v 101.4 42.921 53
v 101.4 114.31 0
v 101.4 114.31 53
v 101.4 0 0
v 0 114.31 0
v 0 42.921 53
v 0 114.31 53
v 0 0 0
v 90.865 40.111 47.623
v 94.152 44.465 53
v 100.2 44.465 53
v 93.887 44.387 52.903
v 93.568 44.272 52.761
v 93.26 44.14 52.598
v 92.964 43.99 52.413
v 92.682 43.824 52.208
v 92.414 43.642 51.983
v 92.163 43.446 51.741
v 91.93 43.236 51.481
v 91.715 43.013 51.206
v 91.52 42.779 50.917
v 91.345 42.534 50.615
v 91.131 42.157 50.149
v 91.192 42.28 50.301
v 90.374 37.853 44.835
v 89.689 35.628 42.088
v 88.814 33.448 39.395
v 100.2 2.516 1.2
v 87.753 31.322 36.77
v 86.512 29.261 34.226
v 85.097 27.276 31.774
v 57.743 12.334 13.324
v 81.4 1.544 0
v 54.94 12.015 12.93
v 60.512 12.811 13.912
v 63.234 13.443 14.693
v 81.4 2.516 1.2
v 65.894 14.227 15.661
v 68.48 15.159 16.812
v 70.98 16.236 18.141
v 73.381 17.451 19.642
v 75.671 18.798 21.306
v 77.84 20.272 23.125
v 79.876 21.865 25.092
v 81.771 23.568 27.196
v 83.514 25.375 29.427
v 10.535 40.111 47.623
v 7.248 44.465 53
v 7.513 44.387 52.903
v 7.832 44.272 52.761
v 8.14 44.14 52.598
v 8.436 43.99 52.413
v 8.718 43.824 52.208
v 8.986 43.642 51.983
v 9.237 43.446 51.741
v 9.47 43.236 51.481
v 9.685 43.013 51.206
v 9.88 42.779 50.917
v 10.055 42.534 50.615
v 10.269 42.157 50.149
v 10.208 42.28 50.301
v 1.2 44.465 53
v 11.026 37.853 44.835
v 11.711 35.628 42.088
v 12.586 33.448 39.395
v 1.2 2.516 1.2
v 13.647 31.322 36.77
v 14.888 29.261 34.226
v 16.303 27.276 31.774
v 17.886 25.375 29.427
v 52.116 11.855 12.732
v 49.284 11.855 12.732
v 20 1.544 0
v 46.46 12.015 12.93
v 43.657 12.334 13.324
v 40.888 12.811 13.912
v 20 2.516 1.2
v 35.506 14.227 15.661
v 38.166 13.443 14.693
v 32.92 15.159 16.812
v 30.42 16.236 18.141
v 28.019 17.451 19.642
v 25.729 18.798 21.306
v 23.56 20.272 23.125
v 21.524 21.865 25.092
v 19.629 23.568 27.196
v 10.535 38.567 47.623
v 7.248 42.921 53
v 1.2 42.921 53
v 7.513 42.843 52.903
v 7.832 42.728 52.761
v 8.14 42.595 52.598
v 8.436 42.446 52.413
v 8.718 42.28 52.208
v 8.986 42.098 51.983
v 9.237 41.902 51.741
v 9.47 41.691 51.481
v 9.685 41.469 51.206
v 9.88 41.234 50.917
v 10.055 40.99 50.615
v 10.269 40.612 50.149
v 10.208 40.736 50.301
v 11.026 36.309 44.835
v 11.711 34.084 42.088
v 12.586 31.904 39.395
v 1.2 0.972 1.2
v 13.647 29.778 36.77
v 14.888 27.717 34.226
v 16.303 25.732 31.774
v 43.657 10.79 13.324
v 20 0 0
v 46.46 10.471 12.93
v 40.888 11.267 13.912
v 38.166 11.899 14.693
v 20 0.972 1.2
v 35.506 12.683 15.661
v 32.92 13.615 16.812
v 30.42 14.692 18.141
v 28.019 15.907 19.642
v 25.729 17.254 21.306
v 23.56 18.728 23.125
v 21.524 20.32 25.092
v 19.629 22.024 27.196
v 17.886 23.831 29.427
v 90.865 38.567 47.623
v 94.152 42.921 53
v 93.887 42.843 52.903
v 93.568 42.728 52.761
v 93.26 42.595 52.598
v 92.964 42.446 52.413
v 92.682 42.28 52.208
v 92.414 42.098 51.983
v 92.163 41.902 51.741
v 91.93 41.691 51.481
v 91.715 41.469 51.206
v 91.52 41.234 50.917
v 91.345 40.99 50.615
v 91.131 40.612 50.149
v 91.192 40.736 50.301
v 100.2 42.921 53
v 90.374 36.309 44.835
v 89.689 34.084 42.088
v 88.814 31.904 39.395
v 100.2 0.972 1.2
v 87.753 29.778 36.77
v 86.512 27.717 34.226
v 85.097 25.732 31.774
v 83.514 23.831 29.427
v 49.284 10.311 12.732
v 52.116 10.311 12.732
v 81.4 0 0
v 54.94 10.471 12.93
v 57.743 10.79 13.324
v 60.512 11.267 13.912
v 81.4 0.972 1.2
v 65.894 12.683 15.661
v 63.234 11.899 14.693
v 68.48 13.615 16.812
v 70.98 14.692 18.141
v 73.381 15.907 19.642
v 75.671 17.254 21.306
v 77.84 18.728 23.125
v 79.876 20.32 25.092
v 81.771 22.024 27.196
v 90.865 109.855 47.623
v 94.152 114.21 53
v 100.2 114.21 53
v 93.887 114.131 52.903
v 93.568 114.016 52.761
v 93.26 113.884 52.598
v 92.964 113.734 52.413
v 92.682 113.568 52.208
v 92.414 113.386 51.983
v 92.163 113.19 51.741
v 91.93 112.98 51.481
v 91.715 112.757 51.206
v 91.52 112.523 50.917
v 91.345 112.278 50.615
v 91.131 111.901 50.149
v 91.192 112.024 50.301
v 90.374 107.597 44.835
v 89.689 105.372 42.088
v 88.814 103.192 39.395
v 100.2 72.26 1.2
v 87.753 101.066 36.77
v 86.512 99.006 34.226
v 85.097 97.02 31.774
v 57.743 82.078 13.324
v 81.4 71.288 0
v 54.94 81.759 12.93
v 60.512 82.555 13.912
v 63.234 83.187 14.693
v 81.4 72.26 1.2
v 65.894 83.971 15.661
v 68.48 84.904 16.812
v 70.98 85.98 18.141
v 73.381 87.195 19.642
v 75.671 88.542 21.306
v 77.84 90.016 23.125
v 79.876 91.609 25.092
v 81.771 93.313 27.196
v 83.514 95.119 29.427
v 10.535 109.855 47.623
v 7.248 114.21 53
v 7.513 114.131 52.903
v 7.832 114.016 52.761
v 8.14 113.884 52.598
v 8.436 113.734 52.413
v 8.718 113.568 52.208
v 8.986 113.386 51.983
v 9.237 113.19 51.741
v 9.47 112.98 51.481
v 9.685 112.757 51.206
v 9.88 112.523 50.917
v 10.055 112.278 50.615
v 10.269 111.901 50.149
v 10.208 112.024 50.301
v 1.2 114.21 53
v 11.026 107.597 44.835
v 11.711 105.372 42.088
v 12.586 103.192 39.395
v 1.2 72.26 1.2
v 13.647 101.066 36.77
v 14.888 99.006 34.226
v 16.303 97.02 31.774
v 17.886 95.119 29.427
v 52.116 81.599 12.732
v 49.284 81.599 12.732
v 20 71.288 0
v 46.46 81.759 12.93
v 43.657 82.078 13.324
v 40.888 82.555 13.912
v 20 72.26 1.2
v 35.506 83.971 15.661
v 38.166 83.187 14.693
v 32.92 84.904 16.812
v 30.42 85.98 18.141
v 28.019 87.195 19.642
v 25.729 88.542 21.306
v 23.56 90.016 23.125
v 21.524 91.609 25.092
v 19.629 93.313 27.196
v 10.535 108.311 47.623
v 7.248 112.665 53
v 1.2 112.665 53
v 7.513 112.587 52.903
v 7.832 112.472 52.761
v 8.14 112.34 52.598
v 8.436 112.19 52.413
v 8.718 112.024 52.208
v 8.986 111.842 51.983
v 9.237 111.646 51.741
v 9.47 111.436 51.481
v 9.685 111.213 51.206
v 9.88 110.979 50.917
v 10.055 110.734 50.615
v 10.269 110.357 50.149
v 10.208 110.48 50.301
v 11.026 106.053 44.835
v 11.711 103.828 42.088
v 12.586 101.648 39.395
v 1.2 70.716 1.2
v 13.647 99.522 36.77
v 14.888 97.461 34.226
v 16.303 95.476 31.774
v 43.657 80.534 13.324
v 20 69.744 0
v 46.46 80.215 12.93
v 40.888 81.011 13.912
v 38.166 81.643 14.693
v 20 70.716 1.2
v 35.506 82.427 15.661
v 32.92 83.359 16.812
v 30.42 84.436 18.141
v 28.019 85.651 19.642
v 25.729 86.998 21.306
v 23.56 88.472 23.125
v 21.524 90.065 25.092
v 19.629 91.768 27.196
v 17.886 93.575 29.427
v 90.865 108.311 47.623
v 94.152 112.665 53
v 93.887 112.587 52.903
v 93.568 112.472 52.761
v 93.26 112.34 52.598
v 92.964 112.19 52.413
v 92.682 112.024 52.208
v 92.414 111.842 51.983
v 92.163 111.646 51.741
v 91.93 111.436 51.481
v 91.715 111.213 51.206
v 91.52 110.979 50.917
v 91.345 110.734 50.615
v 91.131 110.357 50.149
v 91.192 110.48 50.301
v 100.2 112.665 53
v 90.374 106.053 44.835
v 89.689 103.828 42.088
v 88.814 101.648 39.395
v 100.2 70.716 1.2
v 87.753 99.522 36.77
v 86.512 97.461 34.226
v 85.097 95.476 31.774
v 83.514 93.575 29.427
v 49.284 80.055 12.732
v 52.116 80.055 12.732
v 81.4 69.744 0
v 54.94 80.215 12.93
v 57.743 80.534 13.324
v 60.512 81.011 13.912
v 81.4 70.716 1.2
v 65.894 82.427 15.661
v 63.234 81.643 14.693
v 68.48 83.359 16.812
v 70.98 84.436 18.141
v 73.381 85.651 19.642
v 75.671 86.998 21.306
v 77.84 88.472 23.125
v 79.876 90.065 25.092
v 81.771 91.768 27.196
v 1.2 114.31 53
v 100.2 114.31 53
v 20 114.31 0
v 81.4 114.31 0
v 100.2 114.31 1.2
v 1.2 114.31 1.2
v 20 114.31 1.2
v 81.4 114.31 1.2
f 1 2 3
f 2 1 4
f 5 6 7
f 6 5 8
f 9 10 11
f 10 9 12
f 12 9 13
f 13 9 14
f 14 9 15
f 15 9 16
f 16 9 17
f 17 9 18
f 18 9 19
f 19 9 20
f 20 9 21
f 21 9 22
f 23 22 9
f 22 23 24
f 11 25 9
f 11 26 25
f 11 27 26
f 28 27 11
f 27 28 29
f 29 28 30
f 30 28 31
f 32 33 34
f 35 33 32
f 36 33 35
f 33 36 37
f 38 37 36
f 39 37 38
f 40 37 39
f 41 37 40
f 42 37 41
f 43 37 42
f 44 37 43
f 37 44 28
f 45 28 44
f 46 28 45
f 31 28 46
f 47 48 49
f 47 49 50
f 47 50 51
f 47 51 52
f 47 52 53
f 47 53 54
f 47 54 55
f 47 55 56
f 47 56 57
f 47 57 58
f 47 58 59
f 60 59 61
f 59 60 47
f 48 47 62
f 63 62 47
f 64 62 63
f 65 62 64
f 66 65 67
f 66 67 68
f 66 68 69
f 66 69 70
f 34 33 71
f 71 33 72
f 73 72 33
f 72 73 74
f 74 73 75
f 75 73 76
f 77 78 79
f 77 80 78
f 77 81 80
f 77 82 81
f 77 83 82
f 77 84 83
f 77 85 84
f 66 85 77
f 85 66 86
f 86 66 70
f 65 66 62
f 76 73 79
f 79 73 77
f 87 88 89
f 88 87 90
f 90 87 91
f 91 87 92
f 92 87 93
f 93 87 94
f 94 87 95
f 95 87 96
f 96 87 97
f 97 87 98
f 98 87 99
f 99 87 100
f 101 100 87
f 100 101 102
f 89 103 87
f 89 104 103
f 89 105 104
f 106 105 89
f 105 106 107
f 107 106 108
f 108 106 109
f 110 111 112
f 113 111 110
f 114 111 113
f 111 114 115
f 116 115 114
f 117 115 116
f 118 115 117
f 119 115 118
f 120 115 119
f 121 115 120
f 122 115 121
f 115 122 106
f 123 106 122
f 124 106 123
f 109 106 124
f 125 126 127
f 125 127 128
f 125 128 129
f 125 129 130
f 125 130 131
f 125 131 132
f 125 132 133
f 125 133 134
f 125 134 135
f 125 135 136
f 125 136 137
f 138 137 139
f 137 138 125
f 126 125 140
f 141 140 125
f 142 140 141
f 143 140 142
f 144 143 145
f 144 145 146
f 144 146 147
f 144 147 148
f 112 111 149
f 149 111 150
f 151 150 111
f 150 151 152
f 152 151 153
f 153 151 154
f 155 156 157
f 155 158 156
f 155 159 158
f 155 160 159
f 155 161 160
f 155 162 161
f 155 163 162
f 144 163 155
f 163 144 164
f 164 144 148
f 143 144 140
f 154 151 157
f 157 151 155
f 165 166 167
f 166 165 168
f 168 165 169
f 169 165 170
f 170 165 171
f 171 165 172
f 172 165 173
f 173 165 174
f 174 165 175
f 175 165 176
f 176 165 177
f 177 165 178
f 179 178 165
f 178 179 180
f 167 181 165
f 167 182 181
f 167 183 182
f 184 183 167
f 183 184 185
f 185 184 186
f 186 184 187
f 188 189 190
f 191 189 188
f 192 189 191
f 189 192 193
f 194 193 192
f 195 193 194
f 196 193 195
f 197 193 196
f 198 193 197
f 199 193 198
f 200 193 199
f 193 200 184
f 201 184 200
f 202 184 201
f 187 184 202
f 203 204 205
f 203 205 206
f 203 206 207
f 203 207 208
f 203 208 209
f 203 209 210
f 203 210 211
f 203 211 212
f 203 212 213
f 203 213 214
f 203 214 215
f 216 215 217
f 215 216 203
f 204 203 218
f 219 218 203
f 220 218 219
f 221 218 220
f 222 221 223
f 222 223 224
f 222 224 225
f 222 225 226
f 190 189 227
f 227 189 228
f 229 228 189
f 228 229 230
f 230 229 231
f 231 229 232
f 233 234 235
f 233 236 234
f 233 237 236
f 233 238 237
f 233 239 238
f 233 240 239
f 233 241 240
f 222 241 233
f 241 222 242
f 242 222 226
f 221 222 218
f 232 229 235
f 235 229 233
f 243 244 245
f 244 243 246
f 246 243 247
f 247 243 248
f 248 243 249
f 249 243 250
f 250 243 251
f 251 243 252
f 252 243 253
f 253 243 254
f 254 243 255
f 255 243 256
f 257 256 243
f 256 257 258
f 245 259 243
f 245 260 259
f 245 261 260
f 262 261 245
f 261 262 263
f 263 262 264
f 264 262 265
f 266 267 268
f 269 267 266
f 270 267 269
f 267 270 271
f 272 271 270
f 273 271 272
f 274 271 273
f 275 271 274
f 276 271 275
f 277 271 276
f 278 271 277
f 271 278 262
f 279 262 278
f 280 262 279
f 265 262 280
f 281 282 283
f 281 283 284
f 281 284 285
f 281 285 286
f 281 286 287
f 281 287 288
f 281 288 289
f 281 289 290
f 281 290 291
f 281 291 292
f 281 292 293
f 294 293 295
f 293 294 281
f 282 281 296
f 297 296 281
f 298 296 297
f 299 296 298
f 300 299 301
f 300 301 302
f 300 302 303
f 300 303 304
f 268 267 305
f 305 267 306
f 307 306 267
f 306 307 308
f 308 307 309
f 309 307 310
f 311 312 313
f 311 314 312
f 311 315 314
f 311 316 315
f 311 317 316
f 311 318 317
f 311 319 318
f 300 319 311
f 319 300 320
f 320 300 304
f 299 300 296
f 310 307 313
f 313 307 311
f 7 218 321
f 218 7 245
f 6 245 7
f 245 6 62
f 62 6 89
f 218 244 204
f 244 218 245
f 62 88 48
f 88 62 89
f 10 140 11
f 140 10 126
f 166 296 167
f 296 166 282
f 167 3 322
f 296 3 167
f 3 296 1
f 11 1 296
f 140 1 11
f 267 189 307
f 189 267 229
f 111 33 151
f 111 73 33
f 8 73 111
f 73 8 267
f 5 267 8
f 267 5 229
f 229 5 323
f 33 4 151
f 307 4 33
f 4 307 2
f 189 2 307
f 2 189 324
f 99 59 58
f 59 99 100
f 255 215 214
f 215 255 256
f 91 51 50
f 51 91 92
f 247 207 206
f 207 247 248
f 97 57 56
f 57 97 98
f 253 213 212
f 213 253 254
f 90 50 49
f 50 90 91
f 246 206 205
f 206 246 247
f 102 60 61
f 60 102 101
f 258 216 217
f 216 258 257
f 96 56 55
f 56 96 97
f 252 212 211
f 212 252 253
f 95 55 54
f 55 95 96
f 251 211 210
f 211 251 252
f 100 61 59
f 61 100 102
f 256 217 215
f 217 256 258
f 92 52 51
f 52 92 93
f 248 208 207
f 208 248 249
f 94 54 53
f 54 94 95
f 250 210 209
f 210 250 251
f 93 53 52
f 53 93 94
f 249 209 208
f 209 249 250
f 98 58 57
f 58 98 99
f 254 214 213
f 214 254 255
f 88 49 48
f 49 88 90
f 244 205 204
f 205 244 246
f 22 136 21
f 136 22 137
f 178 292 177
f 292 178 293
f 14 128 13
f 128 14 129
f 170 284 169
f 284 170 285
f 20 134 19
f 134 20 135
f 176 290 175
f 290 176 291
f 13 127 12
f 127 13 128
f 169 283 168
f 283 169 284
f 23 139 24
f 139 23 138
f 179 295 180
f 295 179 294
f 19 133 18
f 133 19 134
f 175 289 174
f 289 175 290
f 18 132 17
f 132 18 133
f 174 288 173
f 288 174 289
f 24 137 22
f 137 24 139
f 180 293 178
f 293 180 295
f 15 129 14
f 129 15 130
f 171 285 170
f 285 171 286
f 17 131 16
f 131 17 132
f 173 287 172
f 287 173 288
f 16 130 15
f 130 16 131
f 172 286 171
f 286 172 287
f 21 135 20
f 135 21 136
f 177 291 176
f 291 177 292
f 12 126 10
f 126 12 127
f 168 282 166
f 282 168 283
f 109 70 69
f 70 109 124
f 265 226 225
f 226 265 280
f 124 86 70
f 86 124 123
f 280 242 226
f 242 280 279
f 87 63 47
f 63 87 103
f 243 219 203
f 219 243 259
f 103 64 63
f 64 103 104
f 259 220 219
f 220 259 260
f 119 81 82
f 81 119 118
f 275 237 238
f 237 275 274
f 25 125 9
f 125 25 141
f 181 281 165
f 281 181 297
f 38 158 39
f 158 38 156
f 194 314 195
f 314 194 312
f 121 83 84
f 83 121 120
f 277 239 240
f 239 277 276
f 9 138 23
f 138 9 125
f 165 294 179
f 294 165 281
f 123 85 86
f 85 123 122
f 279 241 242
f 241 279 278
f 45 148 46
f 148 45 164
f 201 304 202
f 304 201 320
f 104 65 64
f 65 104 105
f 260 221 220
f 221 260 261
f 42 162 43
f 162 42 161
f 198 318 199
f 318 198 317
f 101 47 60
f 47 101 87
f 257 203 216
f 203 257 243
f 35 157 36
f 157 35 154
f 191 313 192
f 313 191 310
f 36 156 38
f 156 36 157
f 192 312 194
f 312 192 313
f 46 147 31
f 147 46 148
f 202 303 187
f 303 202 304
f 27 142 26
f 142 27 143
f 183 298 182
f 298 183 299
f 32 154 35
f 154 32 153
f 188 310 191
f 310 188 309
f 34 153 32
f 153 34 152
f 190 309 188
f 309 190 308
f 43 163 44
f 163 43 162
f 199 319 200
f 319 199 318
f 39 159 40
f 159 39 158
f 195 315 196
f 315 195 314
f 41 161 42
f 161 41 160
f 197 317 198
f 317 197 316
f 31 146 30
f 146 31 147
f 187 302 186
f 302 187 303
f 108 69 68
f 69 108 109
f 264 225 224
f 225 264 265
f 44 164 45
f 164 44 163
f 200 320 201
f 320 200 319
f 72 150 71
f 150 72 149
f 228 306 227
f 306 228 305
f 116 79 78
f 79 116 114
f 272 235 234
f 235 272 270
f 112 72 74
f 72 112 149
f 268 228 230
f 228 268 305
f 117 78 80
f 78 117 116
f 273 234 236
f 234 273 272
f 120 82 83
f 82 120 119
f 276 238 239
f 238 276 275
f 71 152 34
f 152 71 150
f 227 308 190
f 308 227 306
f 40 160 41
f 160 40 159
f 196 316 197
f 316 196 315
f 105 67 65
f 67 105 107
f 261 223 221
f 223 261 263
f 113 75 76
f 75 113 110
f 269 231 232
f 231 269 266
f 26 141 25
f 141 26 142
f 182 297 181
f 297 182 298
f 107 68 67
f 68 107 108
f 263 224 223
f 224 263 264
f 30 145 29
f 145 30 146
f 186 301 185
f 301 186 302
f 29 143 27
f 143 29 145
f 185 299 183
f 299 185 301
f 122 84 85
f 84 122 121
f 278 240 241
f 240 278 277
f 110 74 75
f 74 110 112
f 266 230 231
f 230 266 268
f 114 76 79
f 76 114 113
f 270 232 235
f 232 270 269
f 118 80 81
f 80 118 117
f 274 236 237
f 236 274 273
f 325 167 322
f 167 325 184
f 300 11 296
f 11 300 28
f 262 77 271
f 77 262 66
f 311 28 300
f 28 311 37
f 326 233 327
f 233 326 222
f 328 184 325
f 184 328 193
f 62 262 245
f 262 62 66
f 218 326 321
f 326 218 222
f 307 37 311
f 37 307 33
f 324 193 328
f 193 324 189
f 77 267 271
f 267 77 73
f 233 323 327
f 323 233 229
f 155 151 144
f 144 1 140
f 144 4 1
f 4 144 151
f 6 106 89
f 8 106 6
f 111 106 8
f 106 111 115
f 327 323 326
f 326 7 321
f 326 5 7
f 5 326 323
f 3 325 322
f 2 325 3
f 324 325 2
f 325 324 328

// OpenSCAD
// How wide is the card (short side in mm)?
card_width = 67;    // [1:200]
// How tall is the card (long side in mm)?
card_height = 95;   // [1:200]
// How tall do you want the caddy?
box_height = 53;    // [1:200]
// How thick do you want the walls?
wall_thickness = 1.2; // [0.4:5]
// How much space do you want the cards to wiggle side to side?
tolerance = 2; // [0:10]
// List of card stack heights, adding more increases the number of slots
stack_heights = [51];
//projects - 3x 36mm
//corporations - 8mm
//basic corporations - 4mm
//others - 5mm
// How much extra space for each stack?
stack_space = 2; // [0:20]
// Should the bottom be open (less material, but not as strong)?
open_bottom = 1; // [0:No, 1:Yes]

cut_front = 1;
cut_back = 0;

$fn = 90 * 1;
interior_height = box_height - wall_thickness;
box_width = card_height + wall_thickness * 2 + tolerance * 2;
slant = box_height < card_width ? acos(box_height / (card_width + wall_thickness)) : 10;
divider_height = card_width * cos(slant) + wall_thickness;

function add_scalar(v, s) =
    [ for (i = [0: len(v) - 1]) v[i] + s ];
function sumv(v, i, s=0) = (i==s ? v[i] : v[i] + sumv(v, i-1, s));
function cumsum(v)=
    [ for (i = [0 : len(v)]) i==0 ? 0 : sumv(v, i-1) ];

slot_widths = add_scalar(stack_heights, stack_space + wall_thickness);
angled_slot_widths = [for (width = slot_widths) width/cos(slant)];
slot_offsets = cumsum(angled_slot_widths);
cutout_radius = box_width * 0.4;
fillet_width = 5 * 1;
fillet_radius = 5 * 1;
box_depth = slot_offsets[len(slot_offsets) - 1] + card_width * sin(slant) + fillet_radius + 2 * wall_thickness;
    
module fillet_tool(radius, height, overhang = 1) {
    difference() {
        cube([radius + overhang, radius + overhang, height]);
        translate([0,0,-1]) cylinder(r=radius, h=height+2);
    }
}

difference() {
difference() {
    union() {
        difference() {    
            intersection() {
                for (slot_offset = slot_offsets) {
                    translate([0, slot_offset, 0]) rotate([-slant, 0, 0])
                        cube([box_width, wall_thickness, card_width + wall_thickness * 2]);    
                };
                cube([box_width, box_depth, box_height]);
            };
            translate([box_width/2, box_depth, divider_height]) rotate([90,0,0]) union() {
                translate([-cutout_radius-fillet_radius+0.5,-fillet_radius,0])
                    fillet_tool(fillet_radius, box_depth);
                translate([cutout_radius+fillet_width-0.5,-fillet_radius,box_depth]) rotate([0,180,0])
                    fillet_tool(fillet_radius, box_depth);
                cylinder(r=cutout_radius, h= box_depth);
            };
        }
        difference() {
            difference() {
                cube([box_width, box_depth, box_height]);
                translate([box_width + 1, fillet_radius, box_height - fillet_radius]) rotate([-90,180,90])
                    fillet_tool(fillet_radius, box_width + 2);
            }
            translate([wall_thickness, -1, wall_thickness]) cube([box_width - wall_thickness * 2, box_depth + 2, box_height]);
            if (open_bottom) {
                translate([20,0,-1]) cube([box_width - 40, box_depth, wall_thickness+1.1]);
            }
        }
    }
    translate([-1, box_depth - fillet_radius, box_height - fillet_radius]) rotate([-90,180,-90])
        fillet_tool(fillet_radius, box_width + 2);
}
union()
{
  if(cut_front)
  {
    rotate([90, 0, 90])
    {
      linear_extrude(height = box_width)
      {
        polygon(points= [
                          [0, 0],
                          [0, box_height],
                          [tan(slant) * box_height, box_height]
                        ]);
      }
    }
  }
  if(cut_back)
  {
    translate([0, box_depth - fillet_radius, box_height])
    {
      rotate([270, 0, 270])
      {
        linear_extrude(height = box_width)
        {
          polygon(points= [
                            [0, 0],
                            [0, box_height],
                            [tan(slant) * box_height, box_height]
                          ]);
        }
      }
    }
  }
  translate([0, box_depth - fillet_radius, 0])
  {
    cube([box_width, fillet_radius, box_height]);
  }
}

}

echo("Box width", box_width);
echo("Depth: ", box_depth - fillet_radius, " mm");
echo("Depth of base: ", box_depth - fillet_radius - (tan(slant) * box_height), " mm");
